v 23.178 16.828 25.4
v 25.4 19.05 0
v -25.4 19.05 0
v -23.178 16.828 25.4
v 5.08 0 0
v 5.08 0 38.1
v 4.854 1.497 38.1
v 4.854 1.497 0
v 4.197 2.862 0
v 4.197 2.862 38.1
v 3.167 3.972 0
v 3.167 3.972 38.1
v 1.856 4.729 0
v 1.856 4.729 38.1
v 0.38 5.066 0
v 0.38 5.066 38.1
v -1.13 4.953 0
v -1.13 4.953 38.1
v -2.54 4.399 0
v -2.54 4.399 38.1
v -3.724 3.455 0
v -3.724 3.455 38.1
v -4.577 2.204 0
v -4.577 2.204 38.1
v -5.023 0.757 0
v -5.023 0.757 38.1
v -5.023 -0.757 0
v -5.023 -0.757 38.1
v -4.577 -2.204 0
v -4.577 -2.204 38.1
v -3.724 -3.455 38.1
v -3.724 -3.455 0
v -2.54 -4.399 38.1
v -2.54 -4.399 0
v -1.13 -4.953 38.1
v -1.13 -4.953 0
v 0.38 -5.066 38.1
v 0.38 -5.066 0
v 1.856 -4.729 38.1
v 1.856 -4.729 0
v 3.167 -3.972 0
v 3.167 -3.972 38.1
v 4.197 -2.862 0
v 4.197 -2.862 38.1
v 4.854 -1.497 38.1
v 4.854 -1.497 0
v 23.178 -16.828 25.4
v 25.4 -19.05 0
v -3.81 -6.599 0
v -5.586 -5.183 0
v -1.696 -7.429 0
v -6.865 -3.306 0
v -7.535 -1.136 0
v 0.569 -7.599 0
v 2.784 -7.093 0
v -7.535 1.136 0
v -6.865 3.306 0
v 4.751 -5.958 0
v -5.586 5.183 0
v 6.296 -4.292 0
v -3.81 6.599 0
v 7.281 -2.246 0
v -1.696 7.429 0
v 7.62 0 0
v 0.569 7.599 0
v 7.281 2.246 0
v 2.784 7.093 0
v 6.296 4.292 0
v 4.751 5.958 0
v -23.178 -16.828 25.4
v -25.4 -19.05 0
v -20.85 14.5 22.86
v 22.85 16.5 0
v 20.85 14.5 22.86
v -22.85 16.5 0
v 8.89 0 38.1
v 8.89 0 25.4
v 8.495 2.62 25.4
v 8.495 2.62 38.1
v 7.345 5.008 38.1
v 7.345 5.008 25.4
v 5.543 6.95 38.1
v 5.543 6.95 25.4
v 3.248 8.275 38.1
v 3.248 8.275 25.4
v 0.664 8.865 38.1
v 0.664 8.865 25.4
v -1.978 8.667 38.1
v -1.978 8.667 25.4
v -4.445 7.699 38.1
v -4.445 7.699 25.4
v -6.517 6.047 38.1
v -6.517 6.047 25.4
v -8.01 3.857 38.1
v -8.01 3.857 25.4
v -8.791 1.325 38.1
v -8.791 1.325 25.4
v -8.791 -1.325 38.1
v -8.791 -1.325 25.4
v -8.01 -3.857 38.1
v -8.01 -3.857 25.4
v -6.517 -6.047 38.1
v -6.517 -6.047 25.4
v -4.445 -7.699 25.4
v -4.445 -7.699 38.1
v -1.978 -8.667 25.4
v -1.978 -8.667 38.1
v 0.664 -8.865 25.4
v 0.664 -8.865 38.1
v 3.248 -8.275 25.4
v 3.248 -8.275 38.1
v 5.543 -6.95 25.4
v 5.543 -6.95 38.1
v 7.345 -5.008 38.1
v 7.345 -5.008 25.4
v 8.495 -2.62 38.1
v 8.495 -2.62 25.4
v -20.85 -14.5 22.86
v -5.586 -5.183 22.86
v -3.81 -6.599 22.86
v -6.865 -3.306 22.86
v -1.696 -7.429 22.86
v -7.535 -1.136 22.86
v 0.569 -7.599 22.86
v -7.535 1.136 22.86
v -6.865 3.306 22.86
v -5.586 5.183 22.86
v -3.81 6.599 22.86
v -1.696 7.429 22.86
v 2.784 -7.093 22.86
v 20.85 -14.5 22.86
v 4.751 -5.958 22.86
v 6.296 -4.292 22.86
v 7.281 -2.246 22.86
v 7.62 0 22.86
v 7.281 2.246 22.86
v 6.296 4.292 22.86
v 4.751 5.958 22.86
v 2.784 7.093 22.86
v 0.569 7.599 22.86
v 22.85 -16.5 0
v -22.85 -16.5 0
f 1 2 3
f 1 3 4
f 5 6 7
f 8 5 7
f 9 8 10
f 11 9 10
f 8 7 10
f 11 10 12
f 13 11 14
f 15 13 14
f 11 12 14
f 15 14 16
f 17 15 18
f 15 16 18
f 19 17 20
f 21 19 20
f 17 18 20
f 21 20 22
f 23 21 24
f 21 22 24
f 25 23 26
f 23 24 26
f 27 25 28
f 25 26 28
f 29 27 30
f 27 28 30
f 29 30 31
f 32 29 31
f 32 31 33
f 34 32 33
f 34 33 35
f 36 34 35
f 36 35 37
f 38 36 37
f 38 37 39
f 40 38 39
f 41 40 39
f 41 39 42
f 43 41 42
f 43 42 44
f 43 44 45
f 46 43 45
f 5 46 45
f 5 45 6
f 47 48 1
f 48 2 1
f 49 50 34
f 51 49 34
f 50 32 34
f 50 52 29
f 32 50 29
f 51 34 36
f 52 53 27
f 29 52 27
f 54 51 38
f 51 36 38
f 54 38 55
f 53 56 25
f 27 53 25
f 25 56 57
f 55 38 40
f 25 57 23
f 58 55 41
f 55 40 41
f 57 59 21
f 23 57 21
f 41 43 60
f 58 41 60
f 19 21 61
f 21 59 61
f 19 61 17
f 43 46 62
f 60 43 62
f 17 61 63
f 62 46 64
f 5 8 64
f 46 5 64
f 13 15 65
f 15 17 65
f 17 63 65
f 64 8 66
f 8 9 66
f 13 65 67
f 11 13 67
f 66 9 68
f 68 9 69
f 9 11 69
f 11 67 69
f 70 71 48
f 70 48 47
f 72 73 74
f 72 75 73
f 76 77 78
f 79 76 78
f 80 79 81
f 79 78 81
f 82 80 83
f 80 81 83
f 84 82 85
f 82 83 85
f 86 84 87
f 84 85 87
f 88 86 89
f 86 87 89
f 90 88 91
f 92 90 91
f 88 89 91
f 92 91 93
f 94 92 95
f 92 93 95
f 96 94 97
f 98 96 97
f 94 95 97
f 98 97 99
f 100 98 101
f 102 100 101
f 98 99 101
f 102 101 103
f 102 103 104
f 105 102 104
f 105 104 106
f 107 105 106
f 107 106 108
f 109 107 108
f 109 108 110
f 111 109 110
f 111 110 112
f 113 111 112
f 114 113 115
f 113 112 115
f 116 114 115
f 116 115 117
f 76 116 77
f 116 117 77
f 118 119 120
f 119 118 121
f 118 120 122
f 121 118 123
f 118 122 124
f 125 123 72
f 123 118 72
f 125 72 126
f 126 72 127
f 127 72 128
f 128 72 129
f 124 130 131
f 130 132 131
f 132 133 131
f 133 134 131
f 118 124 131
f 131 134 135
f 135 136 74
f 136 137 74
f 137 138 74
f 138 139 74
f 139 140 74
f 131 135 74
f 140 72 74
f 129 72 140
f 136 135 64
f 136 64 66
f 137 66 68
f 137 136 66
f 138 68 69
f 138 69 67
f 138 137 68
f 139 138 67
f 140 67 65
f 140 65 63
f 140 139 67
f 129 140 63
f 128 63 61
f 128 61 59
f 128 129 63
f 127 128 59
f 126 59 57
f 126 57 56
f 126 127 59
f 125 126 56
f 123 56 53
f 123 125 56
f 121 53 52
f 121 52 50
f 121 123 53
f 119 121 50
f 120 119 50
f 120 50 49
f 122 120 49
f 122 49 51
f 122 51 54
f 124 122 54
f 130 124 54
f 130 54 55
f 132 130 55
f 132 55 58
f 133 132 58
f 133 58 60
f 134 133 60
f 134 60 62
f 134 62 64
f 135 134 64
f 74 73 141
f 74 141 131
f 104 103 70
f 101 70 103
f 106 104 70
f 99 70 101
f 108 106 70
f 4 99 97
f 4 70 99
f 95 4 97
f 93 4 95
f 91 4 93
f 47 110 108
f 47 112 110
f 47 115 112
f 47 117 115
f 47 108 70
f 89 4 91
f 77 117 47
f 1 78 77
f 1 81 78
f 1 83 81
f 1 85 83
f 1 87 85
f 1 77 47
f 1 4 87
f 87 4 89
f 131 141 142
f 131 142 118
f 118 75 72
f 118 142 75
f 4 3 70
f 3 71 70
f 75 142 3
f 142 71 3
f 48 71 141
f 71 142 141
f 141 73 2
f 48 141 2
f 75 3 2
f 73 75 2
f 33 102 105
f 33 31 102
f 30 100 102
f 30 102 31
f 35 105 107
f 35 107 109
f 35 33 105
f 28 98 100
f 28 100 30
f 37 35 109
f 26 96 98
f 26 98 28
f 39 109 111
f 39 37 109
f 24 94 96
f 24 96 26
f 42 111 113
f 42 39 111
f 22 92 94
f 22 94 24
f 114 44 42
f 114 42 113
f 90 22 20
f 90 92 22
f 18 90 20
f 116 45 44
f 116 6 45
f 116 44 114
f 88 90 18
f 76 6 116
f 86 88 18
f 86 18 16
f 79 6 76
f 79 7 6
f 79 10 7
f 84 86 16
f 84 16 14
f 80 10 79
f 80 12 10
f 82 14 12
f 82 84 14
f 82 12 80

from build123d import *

# Parameters (mm, degrees)
F0_W     = 50.8
F0_H     = 38.1
F1_DEPTH = 25.4
F1_TAPER = 5
F2_R     = 8.89
F3_DEPTH = 12.7
F4_R     = 5.08
F5_DEPTH = 38.101
F6_T     = -2.54


with BuildPart() as f1:
    # F0 (on Top) → F1 (new body)
    with BuildSketch(Plane.XY):
        Rectangle(F0_W, F0_H)
    extrude(amount=F1_DEPTH, taper=F1_TAPER)

    # F2 (on face) → F3 (join)
    with BuildSketch(Plane.XY.offset(25.4)):
        Circle(F2_R)
    extrude(amount=F3_DEPTH)

    # F4 (on face) → F5 (cut, through all)
    with BuildSketch(Plane.XY.offset(38.1)):
        Circle(F4_R)
    extrude(amount=-F5_DEPTH, mode=Mode.SUBTRACT)

    # F6
    f6_openings = [f1.faces().sort_by_distance(p)[0] for p in [
        (24.765, 0, 0),
    ]]
    offset(amount=F6_T, openings=f6_openings, kind=Kind.INTERSECTION)


solid = f1.part
